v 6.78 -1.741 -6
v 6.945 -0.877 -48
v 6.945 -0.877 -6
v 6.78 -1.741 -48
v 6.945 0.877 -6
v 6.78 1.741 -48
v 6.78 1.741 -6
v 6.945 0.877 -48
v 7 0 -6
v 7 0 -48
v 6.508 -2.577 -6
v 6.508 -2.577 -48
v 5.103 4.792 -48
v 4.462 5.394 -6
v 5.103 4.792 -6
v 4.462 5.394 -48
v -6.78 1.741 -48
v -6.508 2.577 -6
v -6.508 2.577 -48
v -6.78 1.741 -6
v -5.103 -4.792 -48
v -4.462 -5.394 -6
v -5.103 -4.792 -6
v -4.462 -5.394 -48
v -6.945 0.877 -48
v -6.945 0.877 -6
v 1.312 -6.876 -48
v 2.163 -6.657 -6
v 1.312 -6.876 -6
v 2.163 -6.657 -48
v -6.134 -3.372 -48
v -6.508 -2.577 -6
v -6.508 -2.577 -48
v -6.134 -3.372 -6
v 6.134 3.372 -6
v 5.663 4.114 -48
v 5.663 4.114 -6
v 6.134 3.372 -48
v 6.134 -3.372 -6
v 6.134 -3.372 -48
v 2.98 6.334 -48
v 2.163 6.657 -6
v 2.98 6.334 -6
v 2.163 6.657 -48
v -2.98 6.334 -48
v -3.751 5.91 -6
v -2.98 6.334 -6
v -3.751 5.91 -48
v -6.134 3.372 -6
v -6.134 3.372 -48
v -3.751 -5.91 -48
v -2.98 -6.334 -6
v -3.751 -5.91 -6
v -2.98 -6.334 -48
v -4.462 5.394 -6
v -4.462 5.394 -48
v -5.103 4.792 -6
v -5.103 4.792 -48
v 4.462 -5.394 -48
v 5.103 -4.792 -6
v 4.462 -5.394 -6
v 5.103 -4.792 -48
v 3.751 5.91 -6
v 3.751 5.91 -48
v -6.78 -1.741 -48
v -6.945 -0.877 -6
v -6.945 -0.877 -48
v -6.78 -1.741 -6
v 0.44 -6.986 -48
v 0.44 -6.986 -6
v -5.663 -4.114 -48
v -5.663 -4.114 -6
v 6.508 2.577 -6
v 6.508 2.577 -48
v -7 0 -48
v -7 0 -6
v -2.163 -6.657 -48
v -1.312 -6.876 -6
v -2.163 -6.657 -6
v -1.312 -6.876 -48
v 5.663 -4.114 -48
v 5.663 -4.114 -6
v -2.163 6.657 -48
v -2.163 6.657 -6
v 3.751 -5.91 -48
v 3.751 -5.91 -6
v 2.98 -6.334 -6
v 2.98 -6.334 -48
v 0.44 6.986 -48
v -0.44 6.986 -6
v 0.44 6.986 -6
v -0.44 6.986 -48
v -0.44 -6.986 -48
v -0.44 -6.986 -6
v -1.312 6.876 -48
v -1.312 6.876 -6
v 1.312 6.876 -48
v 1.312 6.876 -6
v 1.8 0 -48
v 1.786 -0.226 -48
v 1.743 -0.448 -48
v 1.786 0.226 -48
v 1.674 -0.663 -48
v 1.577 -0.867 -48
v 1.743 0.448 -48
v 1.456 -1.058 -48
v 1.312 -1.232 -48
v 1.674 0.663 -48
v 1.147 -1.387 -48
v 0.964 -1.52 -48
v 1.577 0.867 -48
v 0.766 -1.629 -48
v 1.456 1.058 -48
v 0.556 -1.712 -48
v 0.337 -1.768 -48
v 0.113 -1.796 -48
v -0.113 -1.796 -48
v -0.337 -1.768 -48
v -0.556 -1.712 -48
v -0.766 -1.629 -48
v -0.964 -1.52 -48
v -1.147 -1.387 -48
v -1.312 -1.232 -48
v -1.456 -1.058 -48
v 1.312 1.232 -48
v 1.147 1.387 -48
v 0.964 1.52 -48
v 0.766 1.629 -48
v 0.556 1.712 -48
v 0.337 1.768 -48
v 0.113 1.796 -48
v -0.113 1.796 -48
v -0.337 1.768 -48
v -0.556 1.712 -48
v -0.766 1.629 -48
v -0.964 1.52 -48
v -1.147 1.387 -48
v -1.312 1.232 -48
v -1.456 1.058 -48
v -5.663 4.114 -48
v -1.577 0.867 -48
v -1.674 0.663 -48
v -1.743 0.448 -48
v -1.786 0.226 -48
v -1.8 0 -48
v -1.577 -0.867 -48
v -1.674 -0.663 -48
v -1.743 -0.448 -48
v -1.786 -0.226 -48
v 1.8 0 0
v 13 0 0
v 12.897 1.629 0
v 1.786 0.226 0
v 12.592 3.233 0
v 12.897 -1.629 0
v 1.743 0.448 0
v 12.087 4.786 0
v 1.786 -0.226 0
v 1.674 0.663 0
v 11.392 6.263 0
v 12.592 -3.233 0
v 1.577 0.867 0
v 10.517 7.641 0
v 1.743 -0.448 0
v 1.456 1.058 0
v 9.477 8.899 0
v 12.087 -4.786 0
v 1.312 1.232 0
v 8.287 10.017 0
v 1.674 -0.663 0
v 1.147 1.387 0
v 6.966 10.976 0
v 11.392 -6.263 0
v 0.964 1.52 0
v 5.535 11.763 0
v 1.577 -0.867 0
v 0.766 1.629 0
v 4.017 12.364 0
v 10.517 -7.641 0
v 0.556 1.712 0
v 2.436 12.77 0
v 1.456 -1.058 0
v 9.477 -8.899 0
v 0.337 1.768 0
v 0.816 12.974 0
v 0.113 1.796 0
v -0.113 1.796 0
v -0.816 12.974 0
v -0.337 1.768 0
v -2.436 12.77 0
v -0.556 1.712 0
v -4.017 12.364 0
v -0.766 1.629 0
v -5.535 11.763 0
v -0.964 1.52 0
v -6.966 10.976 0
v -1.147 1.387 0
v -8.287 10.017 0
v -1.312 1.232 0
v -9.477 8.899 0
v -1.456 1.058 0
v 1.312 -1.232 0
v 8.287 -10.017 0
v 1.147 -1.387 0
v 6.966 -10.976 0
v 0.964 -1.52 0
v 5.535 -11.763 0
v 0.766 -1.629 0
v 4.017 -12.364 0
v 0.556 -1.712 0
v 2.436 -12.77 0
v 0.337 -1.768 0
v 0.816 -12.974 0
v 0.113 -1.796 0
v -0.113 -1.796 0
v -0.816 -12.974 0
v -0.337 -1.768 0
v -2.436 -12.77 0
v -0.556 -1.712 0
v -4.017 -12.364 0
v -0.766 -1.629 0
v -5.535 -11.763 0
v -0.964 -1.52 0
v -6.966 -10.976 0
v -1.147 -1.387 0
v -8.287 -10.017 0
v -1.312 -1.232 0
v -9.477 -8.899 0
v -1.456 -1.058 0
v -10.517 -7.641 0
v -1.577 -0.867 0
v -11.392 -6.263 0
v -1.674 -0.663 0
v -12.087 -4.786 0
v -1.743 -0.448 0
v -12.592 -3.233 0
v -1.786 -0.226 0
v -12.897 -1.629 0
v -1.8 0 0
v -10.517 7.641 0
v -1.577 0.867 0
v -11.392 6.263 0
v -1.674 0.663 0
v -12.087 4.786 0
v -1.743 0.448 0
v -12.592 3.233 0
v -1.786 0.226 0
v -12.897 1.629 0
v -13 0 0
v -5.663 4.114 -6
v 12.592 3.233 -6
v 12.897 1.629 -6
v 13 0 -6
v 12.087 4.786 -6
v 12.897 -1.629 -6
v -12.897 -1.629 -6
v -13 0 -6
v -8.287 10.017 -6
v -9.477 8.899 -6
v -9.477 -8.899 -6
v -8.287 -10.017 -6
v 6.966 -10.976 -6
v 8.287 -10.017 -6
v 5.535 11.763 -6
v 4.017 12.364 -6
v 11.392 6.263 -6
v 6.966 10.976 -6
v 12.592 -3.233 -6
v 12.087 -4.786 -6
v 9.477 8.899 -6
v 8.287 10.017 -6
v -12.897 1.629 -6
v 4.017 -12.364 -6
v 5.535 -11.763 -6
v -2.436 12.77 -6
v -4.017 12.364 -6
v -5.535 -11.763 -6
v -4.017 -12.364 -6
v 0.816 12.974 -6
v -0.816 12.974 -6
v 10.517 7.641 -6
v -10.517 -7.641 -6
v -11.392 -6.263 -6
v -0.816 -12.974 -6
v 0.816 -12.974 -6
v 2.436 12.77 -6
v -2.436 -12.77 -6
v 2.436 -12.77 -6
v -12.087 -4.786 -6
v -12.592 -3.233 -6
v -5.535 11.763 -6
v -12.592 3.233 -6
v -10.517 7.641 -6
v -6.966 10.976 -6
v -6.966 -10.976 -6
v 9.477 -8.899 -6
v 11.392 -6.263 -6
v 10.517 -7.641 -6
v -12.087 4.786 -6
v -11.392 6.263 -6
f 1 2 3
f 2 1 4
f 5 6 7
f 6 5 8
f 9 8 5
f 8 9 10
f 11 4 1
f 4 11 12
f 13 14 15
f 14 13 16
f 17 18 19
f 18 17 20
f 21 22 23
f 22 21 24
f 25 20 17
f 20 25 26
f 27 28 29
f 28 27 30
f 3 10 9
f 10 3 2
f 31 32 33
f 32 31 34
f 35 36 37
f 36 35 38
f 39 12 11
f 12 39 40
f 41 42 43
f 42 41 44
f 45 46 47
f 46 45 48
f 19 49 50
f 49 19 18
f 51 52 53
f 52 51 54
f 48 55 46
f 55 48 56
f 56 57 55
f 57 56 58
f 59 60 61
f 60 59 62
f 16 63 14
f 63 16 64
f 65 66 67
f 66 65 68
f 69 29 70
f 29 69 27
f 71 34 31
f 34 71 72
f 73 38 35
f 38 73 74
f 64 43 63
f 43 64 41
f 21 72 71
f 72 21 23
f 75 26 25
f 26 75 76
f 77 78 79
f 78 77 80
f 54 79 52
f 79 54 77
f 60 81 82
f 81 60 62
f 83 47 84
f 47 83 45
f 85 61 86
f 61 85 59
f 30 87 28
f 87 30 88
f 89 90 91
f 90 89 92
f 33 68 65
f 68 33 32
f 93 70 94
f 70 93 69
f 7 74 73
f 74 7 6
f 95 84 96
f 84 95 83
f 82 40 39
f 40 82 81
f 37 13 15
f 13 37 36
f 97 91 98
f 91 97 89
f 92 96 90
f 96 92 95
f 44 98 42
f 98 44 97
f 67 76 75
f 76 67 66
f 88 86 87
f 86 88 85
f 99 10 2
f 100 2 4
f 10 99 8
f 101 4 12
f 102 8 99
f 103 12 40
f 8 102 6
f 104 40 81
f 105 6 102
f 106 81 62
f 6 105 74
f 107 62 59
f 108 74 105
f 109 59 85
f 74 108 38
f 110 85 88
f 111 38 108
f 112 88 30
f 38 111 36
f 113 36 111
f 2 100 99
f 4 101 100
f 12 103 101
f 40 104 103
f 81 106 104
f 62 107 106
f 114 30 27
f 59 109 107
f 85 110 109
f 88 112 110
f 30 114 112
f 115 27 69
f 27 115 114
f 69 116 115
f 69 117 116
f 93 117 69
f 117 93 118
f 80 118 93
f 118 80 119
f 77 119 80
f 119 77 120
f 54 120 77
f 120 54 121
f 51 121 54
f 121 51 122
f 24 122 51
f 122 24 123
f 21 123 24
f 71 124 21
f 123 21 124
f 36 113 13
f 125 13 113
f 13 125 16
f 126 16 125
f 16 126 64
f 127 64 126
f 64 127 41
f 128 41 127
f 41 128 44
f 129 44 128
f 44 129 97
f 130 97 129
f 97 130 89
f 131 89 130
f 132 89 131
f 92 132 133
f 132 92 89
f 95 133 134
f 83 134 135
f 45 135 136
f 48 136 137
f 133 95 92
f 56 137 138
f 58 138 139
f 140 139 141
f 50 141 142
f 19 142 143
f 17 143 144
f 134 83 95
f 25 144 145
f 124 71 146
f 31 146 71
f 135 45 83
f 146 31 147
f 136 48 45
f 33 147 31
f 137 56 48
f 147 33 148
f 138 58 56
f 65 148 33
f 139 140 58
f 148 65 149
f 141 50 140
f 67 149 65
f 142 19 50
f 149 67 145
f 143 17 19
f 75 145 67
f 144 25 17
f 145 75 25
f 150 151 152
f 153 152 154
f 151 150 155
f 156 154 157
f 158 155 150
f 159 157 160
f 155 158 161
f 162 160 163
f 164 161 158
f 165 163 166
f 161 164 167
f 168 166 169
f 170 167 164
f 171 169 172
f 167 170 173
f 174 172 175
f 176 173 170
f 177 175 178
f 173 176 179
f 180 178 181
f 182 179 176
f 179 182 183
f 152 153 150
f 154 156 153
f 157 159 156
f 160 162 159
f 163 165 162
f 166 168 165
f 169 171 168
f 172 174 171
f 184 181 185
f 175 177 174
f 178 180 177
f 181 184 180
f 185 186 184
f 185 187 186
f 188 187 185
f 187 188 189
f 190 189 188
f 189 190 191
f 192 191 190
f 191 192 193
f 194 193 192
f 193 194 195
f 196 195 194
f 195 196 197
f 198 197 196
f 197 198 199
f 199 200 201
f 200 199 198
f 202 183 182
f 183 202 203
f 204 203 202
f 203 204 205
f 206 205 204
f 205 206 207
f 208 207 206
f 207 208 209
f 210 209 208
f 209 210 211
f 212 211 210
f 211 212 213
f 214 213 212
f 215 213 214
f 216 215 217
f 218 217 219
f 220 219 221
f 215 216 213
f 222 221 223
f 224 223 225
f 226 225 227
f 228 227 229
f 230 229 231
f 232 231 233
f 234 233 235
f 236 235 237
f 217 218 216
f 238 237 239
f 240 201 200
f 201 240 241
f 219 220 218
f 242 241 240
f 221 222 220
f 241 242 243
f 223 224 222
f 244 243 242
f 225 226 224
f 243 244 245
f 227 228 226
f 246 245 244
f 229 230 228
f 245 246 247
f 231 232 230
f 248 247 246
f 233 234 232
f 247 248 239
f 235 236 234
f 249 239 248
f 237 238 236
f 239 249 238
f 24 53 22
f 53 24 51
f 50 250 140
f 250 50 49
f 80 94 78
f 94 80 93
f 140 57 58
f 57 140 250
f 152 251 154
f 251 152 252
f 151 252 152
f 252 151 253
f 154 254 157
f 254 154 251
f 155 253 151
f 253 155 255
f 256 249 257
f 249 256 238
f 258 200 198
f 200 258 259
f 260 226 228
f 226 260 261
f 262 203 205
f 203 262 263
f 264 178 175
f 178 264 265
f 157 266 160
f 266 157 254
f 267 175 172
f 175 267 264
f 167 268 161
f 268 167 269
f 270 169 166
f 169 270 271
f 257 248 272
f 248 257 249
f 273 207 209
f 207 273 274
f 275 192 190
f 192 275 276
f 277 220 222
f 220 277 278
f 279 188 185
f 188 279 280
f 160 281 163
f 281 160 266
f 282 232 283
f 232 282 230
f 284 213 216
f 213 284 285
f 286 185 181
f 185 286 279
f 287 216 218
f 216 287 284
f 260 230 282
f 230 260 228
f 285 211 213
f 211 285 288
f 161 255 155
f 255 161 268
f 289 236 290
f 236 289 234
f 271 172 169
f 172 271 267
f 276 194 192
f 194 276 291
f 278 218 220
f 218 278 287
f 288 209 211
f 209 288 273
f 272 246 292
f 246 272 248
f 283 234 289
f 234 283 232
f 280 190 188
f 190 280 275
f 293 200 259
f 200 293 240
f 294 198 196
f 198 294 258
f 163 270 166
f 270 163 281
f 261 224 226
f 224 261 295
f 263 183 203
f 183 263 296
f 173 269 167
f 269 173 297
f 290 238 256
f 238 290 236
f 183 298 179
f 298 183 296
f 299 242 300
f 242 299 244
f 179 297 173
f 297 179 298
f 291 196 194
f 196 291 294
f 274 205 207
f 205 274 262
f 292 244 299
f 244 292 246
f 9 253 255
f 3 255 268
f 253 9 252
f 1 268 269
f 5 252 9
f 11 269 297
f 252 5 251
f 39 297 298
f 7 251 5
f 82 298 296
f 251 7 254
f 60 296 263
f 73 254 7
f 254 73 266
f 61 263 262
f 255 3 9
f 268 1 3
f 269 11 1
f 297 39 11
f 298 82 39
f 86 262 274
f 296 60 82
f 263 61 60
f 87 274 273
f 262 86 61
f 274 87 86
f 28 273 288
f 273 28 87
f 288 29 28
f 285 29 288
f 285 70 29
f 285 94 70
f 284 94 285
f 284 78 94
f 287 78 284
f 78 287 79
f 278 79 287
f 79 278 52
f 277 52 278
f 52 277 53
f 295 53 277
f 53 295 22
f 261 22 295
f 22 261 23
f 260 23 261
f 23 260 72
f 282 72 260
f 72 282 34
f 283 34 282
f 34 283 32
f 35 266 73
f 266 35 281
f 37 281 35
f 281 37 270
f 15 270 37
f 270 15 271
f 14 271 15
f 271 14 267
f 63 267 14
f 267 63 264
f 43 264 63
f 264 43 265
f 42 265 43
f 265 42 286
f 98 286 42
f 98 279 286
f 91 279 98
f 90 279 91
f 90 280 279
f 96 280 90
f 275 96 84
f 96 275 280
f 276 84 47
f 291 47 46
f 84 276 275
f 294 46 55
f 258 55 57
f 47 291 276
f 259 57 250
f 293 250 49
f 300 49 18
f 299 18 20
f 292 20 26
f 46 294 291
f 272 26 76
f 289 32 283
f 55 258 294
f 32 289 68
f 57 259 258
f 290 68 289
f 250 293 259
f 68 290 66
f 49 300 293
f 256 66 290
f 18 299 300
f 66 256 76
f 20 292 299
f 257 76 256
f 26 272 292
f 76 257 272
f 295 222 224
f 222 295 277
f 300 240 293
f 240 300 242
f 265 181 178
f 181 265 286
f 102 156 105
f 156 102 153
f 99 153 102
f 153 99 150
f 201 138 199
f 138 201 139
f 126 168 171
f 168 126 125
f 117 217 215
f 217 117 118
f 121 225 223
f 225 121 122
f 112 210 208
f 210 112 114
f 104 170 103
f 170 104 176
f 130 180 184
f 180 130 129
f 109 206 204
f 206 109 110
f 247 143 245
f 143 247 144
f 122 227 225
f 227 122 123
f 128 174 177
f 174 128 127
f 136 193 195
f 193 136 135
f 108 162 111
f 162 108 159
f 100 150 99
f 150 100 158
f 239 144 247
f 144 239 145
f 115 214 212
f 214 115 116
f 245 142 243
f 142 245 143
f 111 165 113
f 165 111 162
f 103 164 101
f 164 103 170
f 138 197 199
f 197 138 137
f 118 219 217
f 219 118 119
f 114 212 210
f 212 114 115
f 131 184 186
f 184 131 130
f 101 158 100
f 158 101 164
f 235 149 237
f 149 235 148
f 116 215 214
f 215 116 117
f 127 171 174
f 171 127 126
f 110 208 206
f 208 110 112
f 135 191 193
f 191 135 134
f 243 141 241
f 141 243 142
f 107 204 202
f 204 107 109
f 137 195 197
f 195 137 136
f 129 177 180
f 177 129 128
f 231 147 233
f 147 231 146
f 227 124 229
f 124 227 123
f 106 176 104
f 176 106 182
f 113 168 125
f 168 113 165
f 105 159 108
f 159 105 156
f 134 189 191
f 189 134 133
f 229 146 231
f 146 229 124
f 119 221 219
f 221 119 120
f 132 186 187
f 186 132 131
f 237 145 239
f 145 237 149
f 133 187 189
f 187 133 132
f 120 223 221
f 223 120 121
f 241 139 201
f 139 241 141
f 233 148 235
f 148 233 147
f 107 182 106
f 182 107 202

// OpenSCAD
$fn = 50;


difference() {
	union() {
		translate(v = [0, 0, -48.0000000000]) {
			cylinder(h = 48, r = 7.0000000000);
		}
		translate(v = [0, 0, -6.0000000000]) {
			cylinder(h = 6, r = 13.0000000000);
		}
	}
	union() {
		#translate(v = [0, 0, -48]) {
			cylinder(h = 48, r = 1.8000000000);
		}
	}
}
